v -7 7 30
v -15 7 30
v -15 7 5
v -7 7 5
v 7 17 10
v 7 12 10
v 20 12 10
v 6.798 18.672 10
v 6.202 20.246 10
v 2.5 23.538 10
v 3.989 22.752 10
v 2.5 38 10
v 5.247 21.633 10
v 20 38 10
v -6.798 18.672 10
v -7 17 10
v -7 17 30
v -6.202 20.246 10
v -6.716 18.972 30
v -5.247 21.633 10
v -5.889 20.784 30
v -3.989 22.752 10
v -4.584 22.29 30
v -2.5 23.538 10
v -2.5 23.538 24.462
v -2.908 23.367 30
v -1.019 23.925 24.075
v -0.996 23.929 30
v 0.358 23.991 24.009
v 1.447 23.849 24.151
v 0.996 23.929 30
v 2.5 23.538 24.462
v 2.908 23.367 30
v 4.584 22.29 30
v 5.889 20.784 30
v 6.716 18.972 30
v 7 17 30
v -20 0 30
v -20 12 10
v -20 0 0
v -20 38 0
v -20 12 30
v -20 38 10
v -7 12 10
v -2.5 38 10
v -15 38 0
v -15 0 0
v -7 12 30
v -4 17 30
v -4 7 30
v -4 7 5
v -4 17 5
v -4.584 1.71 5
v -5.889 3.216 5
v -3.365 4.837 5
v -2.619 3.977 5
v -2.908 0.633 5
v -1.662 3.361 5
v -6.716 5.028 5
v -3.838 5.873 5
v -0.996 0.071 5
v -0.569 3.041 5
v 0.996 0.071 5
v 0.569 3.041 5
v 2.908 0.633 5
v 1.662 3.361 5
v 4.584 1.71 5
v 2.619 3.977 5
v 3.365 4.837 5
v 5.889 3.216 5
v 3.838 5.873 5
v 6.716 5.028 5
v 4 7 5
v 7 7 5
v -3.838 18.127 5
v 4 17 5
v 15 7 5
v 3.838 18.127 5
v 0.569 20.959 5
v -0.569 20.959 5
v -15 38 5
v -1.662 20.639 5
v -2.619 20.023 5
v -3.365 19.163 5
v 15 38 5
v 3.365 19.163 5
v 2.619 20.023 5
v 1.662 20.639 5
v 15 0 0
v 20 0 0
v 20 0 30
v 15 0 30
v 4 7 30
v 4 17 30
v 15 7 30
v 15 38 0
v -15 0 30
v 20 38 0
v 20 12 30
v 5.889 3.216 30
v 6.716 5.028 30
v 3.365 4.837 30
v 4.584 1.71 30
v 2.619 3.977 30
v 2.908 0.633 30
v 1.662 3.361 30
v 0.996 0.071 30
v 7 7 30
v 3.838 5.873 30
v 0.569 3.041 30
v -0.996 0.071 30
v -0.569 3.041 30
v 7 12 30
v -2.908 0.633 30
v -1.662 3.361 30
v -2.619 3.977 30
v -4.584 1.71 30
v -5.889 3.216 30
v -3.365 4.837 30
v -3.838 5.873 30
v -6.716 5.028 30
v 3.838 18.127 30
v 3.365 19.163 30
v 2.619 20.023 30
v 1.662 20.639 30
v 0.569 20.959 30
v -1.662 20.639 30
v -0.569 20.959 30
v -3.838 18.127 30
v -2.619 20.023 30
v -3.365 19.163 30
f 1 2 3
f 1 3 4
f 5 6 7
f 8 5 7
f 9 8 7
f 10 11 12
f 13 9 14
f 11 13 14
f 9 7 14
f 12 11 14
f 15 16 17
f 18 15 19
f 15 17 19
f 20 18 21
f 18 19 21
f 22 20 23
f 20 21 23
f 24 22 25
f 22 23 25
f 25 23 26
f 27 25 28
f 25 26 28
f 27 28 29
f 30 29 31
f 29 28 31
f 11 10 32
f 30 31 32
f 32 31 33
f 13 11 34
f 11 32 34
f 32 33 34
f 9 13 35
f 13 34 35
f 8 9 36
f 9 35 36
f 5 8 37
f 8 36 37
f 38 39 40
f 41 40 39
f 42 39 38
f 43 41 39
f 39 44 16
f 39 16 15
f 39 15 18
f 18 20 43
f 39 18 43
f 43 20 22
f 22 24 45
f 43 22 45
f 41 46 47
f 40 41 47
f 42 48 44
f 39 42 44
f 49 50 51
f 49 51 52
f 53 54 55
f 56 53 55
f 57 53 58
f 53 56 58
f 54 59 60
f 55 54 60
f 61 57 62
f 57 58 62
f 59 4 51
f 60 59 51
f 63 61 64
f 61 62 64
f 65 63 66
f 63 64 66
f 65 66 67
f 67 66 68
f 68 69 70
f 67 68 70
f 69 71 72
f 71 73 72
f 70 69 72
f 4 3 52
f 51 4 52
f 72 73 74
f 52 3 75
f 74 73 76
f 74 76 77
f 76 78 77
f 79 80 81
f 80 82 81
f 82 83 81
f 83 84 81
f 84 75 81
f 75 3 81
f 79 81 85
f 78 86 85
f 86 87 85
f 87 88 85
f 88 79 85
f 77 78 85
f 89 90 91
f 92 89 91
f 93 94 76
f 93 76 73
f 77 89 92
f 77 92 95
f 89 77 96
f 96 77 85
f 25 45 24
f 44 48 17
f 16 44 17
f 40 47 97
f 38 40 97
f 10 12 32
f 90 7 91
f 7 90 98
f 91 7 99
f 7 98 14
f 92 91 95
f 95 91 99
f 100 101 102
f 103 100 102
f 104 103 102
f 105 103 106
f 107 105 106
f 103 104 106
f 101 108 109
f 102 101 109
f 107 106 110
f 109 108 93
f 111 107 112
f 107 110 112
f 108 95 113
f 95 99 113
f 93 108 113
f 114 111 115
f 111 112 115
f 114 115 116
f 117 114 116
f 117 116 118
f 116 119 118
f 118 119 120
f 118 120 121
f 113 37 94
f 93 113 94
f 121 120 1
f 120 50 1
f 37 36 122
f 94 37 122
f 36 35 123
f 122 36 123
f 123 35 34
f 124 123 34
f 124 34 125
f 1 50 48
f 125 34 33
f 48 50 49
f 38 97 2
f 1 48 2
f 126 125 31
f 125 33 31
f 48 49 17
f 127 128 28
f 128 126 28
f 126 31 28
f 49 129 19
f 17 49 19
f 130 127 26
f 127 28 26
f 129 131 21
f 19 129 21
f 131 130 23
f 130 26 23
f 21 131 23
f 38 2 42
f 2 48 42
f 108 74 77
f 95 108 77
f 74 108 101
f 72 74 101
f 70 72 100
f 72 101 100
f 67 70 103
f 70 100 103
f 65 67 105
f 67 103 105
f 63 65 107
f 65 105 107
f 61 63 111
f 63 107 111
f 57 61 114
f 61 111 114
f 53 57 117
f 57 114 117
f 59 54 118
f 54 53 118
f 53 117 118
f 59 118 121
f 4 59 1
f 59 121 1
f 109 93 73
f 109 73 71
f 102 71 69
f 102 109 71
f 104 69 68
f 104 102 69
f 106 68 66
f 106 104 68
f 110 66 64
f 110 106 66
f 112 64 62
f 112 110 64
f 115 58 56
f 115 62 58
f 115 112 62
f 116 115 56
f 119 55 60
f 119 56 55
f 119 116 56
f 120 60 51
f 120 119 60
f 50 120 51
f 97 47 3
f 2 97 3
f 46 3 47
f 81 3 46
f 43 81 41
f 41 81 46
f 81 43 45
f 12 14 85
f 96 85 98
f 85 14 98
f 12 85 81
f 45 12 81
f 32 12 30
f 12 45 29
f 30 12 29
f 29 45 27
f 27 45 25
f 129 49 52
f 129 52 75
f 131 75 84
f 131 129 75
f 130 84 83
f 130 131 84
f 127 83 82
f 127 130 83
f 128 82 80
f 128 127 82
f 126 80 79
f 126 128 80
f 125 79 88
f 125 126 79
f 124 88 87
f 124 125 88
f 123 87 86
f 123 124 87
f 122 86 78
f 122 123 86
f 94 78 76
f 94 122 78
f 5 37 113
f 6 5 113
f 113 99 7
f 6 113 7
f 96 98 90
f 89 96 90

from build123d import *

# Parameters (mm, degrees)
BOSS_EXTRUDE1_DEPTH = 20
SKETCH2_W           = 30
SKETCH2_H           = 7
CUT_EXTRUDE1_DEPTH  = 31
BOSS_EXTRUDE3_DEPTH = 30
CUT_EXTRUDE2_DEPTH  = 31
SKETCH5_W           = 30
SKETCH5_H           = 5
CUT_EXTRUDE3_DEPTH  = 39
RIB2_REACH          = 22
SKETCH6_WALL_W      = 61.798989874
SKETCH6_WALL_H      = 5


with BuildPart() as part:
    # Sketch1 → Boss-Extrude1 (new body, symmetric)
    with BuildSketch(Plane(origin=(0, 0, 0), x_dir=(0, 0, -1), z_dir=(1, 0, 0))):
        Polygon((0, 38), (0, 0), (-30, 0), (-30, 12), (-10, 12), (-10, 38), align=None)
    extrude(amount=BOSS_EXTRUDE1_DEPTH, both=True)

    # Sketch2 → Cut-Extrude1 (cut, through all)
    with BuildSketch(Plane.XY.offset(30)):
        with Locations((0, 3.5)):
            Rectangle(SKETCH2_W, SKETCH2_H)
    extrude(amount=-CUT_EXTRUDE1_DEPTH, mode=Mode.SUBTRACT)

    # Sketch3 → Boss-Extrude3 (add)
    with BuildSketch(Plane.XY.offset(30)):
        with BuildLine():
            Line((7, 17), (7, 7))
            ThreePointArc((7, 7), (0, 0), (-7, 7))
            Line((-7, 7), (-7, 17))
            ThreePointArc((-7, 17), (0, 24), (7, 17))
        make_face()
    extrude(amount=-BOSS_EXTRUDE3_DEPTH)

    # Sketch4 → Cut-Extrude2 (cut, through all)
    with BuildSketch(Plane.XY.offset(30)):
        with BuildLine():
            Line((4, 17), (4, 7))
            ThreePointArc((4, 7), (0, 3), (-4, 7))
            Line((-4, 7), (-4, 17))
            ThreePointArc((-4, 17), (0, 21), (4, 17))
        make_face()
    extrude(amount=-CUT_EXTRUDE2_DEPTH, mode=Mode.SUBTRACT)

    # Sketch5 → Cut-Extrude3 (cut, through all)
    with BuildSketch(Plane(origin=(0, 38, 0), x_dir=(1, 0, 0), z_dir=(0, 1, 0))):
        with Locations((0, -2.5)):
            Rectangle(SKETCH5_W, SKETCH5_H)
    extrude(amount=-CUT_EXTRUDE3_DEPTH, mode=Mode.SUBTRACT)

    # Sketch6 wall → Rib2 (add, up to next)
    with BuildSketch(Plane(origin=(0, 31, 17), x_dir=(0, -0.707106781, 0.707106781), z_dir=(0, -0.707106781, -0.707106781)), mode=Mode.PRIVATE) as rib2_sk1:
        Rectangle(SKETCH6_WALL_W, SKETCH6_WALL_H)
    rib2_tool1 = extrude(rib2_sk1.sketch, amount=RIB2_REACH, mode=Mode.PRIVATE) - part.part
    add(rib2_tool1.solids().sort_by_distance((0, 31, 17))[0])


solid = part.part
